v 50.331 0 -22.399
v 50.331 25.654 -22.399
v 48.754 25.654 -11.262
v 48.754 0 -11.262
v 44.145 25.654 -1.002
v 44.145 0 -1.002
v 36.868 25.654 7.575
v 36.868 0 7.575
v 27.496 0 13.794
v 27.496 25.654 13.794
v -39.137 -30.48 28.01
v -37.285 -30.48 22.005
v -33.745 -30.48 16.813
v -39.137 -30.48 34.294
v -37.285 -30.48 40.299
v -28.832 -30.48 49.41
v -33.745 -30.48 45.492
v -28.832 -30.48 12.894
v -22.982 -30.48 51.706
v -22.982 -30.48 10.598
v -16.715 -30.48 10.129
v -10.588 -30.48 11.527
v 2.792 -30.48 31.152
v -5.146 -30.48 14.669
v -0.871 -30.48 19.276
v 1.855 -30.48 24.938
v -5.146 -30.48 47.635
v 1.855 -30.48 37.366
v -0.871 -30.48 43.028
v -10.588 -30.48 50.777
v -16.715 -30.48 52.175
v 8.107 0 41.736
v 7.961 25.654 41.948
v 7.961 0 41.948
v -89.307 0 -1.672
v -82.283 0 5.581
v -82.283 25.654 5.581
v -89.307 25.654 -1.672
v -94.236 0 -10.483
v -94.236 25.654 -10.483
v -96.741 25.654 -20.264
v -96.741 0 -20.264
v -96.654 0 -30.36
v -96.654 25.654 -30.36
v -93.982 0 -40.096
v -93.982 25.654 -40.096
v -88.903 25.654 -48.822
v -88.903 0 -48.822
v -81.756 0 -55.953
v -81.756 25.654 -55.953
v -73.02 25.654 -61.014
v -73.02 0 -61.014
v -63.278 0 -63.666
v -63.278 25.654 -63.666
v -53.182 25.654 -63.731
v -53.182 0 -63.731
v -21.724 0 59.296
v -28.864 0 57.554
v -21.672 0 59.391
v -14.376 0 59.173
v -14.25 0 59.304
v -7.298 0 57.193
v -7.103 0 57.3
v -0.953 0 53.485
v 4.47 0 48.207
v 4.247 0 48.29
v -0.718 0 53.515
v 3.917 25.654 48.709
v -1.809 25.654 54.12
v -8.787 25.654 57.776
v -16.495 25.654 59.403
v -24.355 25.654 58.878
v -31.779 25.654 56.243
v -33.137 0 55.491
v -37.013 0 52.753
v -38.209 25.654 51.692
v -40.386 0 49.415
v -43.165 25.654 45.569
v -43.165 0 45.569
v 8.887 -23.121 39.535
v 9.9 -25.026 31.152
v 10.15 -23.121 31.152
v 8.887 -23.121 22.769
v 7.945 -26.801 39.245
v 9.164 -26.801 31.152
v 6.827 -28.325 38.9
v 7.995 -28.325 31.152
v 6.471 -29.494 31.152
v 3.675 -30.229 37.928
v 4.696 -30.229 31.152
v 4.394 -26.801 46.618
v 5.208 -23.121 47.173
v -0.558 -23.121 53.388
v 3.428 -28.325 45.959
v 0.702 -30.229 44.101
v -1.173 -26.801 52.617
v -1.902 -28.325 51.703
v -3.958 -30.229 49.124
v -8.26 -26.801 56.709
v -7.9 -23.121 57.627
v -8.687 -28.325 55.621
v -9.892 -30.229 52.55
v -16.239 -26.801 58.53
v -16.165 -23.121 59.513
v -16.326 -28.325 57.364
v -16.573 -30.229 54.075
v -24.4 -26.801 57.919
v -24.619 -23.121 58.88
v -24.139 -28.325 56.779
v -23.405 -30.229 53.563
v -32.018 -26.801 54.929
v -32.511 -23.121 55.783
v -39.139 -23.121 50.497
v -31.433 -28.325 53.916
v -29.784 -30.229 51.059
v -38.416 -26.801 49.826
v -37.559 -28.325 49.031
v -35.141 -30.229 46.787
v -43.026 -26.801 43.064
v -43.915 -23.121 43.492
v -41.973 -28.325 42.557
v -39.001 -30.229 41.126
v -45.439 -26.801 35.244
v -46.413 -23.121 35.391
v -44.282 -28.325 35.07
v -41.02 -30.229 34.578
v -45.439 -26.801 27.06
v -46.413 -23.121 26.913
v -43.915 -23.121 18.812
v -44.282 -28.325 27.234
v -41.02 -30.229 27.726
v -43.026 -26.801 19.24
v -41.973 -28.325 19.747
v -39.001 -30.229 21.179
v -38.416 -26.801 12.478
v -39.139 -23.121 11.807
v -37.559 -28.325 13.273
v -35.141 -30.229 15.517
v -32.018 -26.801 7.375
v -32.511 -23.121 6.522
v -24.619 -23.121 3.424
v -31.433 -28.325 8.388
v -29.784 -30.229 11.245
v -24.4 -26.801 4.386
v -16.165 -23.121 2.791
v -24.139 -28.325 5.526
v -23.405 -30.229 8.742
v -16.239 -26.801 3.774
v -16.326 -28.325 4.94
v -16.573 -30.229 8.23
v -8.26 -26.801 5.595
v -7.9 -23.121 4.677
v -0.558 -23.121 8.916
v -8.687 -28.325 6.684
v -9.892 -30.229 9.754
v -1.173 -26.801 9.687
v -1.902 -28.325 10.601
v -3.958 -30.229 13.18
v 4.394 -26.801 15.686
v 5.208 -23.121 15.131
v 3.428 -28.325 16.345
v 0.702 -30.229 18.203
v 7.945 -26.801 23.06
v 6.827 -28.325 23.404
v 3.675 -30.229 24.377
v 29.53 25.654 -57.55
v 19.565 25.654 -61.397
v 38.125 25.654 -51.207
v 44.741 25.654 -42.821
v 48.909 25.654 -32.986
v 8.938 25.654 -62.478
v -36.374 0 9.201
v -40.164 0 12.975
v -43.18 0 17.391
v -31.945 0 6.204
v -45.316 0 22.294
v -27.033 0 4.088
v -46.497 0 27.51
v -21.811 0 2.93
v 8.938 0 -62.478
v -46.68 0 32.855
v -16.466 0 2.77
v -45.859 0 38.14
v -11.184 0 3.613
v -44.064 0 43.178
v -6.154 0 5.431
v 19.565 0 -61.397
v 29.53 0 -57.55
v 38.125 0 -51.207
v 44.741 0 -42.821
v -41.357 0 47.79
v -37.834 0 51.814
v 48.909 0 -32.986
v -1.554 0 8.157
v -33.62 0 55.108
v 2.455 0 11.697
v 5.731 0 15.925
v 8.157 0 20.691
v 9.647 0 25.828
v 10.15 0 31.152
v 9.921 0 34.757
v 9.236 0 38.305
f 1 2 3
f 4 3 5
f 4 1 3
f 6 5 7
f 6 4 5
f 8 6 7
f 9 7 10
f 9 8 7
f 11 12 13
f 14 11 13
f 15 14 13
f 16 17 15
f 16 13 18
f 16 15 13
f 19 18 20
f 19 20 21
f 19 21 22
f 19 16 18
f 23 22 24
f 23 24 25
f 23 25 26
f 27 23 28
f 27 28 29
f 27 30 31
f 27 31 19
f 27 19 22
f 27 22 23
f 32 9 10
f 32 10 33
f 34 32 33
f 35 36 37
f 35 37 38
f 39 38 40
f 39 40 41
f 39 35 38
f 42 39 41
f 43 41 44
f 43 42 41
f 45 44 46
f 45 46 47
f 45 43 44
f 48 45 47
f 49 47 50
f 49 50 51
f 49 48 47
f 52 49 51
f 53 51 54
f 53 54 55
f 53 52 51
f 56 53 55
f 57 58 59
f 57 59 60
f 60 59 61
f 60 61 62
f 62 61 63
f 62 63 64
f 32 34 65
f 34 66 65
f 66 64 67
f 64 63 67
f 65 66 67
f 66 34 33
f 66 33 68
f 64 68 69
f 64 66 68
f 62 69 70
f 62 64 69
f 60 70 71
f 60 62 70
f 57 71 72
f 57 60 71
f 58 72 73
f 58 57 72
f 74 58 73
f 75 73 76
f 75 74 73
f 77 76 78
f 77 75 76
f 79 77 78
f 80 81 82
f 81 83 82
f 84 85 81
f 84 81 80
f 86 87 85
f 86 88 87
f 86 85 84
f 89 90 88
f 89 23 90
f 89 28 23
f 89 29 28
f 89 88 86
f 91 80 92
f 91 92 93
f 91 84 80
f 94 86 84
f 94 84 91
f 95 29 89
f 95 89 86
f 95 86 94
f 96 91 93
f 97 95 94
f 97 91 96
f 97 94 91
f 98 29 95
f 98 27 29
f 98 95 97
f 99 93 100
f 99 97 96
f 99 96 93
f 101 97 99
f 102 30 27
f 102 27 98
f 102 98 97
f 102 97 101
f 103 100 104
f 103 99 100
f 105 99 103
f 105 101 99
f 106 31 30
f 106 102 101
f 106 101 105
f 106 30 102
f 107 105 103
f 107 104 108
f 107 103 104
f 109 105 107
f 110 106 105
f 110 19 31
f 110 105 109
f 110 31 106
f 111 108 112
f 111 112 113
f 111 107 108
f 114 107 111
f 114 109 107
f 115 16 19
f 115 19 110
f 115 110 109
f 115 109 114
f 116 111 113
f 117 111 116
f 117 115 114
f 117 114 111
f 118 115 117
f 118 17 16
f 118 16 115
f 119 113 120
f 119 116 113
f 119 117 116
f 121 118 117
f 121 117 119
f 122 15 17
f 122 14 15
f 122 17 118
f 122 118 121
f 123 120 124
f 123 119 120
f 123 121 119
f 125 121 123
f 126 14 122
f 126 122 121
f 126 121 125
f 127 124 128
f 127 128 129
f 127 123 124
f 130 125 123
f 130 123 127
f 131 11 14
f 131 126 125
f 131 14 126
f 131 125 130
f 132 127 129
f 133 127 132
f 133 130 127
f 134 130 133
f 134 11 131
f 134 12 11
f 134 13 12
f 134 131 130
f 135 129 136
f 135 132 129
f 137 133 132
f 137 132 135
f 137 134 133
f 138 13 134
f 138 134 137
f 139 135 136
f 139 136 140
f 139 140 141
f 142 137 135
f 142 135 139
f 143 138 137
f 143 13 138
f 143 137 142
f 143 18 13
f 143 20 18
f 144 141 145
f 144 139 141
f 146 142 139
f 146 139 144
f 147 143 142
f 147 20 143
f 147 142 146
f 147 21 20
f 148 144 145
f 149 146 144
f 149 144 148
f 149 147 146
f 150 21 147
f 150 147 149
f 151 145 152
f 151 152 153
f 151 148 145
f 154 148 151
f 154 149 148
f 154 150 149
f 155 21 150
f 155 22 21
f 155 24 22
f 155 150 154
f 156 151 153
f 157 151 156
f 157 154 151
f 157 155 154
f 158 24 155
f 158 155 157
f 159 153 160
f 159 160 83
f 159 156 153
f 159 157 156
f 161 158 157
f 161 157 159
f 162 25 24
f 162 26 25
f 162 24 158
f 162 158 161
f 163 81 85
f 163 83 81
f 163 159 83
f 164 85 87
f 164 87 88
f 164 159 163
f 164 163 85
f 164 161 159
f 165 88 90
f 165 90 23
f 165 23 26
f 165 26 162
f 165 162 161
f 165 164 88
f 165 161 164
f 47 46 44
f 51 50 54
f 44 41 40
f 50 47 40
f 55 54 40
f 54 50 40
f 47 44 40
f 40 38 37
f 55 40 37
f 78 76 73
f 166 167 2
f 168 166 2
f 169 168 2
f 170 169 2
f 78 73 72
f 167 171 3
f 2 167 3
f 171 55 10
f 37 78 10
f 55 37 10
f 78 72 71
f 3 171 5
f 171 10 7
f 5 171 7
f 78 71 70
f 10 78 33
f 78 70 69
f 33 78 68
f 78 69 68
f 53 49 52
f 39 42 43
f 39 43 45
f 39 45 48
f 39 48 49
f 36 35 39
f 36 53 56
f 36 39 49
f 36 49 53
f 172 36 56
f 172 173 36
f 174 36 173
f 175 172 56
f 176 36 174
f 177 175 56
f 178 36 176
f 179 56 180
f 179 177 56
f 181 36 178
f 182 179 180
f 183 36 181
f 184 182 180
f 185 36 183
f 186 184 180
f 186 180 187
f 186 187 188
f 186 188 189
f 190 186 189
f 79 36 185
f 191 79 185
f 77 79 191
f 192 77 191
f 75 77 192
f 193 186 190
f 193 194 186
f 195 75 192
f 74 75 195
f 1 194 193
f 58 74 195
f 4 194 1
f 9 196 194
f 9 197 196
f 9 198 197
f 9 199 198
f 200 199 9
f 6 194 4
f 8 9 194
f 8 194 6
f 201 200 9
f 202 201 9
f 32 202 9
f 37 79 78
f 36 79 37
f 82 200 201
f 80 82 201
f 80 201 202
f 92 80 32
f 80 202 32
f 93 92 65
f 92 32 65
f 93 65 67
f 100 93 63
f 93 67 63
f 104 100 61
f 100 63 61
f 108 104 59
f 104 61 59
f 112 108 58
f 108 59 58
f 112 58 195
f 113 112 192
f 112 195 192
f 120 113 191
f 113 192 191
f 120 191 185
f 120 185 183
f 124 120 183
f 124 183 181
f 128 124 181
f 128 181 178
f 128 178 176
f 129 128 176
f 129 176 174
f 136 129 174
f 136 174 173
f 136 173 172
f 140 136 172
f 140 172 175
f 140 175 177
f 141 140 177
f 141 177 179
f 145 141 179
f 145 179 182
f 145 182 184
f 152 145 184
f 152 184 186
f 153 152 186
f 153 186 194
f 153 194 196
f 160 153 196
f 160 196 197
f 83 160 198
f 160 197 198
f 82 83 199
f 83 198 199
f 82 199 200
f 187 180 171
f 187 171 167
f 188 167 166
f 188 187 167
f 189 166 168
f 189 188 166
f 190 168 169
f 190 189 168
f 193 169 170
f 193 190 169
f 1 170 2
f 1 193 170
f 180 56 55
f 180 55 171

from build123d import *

# Parameters (mm, degrees)
F1_DEPTH = 25.654
F2_R     = 28.4407370428
F3_DEPTH = 30.48
F4_R     = 7.3585229381


with BuildPart() as f1:
    # F0 (on Front) → F1 (new body)
    with BuildSketch(Plane.XZ):
        with BuildLine():
            ThreePointArc((-21.5344435526, 2.0731437555), (-4.8204991058, 5.3895527458), (7.0882450204, 17.5771005261))
            ThreePointArc((7.0882450204, 17.5771005261), (-8.8670748097, 12.8601538234), (-21.5344435526, 2.0731437555))
        make_face()
        with BuildLine():
            ThreePointArc((7.9605099877, 41.948206774), (9.6731432739, 36.4370915007), (10.2517769659, 30.6950807571))
            ThreePointArc((10.2517769659, 30.6950807571), (9.4497176108, 23.9480566036), (7.0882450204, 17.5771005261))
            ThreePointArc((7.0882450204, 17.5771005261), (17.5408909724, 17.0287274663), (27.4955300755, 13.793966155))
            Line((27.4955300755, 13.793966155), (7.9605099877, 41.948206774))
        make_face()
        with BuildLine():
            ThreePointArc((-23.7264411014, -43.725716795), (-36.04104655, -57.2814370335), (-53.1818165378, -63.731325619))
            Line((-53.1818165378, -63.731325619), (8.938396841, -62.4778672324))
            ThreePointArc((8.938396841, -62.4778672324), (-9.7326904365, -57.1755765902), (-23.7264411014, -43.725716795))
        make_face()
        with BuildLine():
            ThreePointArc((-18.9324777024, -24.9800812453), (-20.5427988057, -13.8821683024), (-25.2409413599, -3.6996213576))
            ThreePointArc((-25.2409413599, -3.6996213576), (-29.8392434552, -23.915311506), (-23.7264411014, -43.725716795))
            ThreePointArc((-23.7264411014, -43.725716795), (-20.1499486388, -34.6545442437), (-18.9324777024, -24.9800812453))
        make_face()
        with BuildLine():
            ThreePointArc((27.4955300755, 13.793966155), (17.5408909724, 17.0287274663), (7.0882450204, 17.5771005261))
            ThreePointArc((7.0882450204, 17.5771005261), (-4.8204991058, 5.3895527458), (-21.5344435526, 2.0731437555))
            ThreePointArc((-21.5344435526, 2.0731437555), (-23.5113697235, -0.7338297985), (-25.2409413599, -3.6996213576))
            ThreePointArc((-25.2409413599, -3.6996213576), (-20.5427988057, -13.8821683024), (-18.9324777024, -24.9800812453))
            ThreePointArc((-18.9324777024, -24.9800812453), (-20.1499486388, -34.6545442437), (-23.7264411014, -43.725716795))
            ThreePointArc((-23.7264411014, -43.725716795), (-9.7326904365, -57.1755765902), (8.938396841, -62.4778672324))
            ThreePointArc((8.938396841, -62.4778672324), (38.12540726, -51.2074452523), (50.331310131, -22.3991144449))
            ThreePointArc((50.331310131, -22.3991144449), (44.1452046519, -1.0016149762), (27.4955300755, 13.793966155))
        make_face()
        with BuildLine():
            ThreePointArc((7.0882450204, 17.5771005261), (9.4497176108, 23.9480566036), (10.2517769659, 30.6950807571))
            ThreePointArc((10.2517769659, 30.6950807571), (9.6731432739, 36.4370915007), (7.9605099877, 41.948206774))
            ThreePointArc((7.9605099877, 41.948206774), (-16.4945513192, 59.4026144185), (-43.1654741186, 45.5690231721))
            ThreePointArc((-43.1654741186, 45.5690231721), (-44.2964170336, 17.8799643072), (-21.5344435526, 2.0731437555))
            ThreePointArc((-21.5344435526, 2.0731437555), (-8.8670748097, 12.8601538234), (7.0882450204, 17.5771005261))
        make_face()
        with BuildLine():
            ThreePointArc((-21.5344435526, 2.0731437555), (-44.2964170336, 17.8799643072), (-43.1654741186, 45.5690231721))
            Line((-43.1654741186, 45.5690231721), (-82.2833511654, 5.5814185032))
            ThreePointArc((-82.2833511654, 5.5814185032), (-51.7089264452, 13.5602395088), (-25.2409413599, -3.6996213576))
            ThreePointArc((-25.2409413599, -3.6996213576), (-23.5113697235, -0.7338297985), (-21.5344435526, 2.0731437555))
        make_face()
        with BuildLine():
            ThreePointArc((-25.2409413599, -3.6996213576), (-51.7089264452, 13.5602395088), (-82.2833511654, 5.5814185032))
            ThreePointArc((-82.2833511654, 5.5814185032), (-93.9821658408, -40.0960598334), (-53.1818165378, -63.731325619))
            ThreePointArc((-53.1818165378, -63.731325619), (-36.04104655, -57.2814370335), (-23.7264411014, -43.725716795))
            ThreePointArc((-23.7264411014, -43.725716795), (-29.8392434552, -23.915311506), (-25.2409413599, -3.6996213576))
        make_face()
    extrude(amount=-F1_DEPTH)

    # F2 (on Front) → F3 (join)
    with BuildSketch(Plane.XZ):
        with Locations((-18.2904135436, 31.1521012336)):
            Circle(F2_R)
    extrude(amount=F3_DEPTH)

    # F4
    f4_edges = [f1.edges().sort_by_distance(p)[0] for p in [
        (-46.731151, -30.48, 31.152101),
    ]]
    fillet(f4_edges, radius=F4_R)


solid = f1.part
